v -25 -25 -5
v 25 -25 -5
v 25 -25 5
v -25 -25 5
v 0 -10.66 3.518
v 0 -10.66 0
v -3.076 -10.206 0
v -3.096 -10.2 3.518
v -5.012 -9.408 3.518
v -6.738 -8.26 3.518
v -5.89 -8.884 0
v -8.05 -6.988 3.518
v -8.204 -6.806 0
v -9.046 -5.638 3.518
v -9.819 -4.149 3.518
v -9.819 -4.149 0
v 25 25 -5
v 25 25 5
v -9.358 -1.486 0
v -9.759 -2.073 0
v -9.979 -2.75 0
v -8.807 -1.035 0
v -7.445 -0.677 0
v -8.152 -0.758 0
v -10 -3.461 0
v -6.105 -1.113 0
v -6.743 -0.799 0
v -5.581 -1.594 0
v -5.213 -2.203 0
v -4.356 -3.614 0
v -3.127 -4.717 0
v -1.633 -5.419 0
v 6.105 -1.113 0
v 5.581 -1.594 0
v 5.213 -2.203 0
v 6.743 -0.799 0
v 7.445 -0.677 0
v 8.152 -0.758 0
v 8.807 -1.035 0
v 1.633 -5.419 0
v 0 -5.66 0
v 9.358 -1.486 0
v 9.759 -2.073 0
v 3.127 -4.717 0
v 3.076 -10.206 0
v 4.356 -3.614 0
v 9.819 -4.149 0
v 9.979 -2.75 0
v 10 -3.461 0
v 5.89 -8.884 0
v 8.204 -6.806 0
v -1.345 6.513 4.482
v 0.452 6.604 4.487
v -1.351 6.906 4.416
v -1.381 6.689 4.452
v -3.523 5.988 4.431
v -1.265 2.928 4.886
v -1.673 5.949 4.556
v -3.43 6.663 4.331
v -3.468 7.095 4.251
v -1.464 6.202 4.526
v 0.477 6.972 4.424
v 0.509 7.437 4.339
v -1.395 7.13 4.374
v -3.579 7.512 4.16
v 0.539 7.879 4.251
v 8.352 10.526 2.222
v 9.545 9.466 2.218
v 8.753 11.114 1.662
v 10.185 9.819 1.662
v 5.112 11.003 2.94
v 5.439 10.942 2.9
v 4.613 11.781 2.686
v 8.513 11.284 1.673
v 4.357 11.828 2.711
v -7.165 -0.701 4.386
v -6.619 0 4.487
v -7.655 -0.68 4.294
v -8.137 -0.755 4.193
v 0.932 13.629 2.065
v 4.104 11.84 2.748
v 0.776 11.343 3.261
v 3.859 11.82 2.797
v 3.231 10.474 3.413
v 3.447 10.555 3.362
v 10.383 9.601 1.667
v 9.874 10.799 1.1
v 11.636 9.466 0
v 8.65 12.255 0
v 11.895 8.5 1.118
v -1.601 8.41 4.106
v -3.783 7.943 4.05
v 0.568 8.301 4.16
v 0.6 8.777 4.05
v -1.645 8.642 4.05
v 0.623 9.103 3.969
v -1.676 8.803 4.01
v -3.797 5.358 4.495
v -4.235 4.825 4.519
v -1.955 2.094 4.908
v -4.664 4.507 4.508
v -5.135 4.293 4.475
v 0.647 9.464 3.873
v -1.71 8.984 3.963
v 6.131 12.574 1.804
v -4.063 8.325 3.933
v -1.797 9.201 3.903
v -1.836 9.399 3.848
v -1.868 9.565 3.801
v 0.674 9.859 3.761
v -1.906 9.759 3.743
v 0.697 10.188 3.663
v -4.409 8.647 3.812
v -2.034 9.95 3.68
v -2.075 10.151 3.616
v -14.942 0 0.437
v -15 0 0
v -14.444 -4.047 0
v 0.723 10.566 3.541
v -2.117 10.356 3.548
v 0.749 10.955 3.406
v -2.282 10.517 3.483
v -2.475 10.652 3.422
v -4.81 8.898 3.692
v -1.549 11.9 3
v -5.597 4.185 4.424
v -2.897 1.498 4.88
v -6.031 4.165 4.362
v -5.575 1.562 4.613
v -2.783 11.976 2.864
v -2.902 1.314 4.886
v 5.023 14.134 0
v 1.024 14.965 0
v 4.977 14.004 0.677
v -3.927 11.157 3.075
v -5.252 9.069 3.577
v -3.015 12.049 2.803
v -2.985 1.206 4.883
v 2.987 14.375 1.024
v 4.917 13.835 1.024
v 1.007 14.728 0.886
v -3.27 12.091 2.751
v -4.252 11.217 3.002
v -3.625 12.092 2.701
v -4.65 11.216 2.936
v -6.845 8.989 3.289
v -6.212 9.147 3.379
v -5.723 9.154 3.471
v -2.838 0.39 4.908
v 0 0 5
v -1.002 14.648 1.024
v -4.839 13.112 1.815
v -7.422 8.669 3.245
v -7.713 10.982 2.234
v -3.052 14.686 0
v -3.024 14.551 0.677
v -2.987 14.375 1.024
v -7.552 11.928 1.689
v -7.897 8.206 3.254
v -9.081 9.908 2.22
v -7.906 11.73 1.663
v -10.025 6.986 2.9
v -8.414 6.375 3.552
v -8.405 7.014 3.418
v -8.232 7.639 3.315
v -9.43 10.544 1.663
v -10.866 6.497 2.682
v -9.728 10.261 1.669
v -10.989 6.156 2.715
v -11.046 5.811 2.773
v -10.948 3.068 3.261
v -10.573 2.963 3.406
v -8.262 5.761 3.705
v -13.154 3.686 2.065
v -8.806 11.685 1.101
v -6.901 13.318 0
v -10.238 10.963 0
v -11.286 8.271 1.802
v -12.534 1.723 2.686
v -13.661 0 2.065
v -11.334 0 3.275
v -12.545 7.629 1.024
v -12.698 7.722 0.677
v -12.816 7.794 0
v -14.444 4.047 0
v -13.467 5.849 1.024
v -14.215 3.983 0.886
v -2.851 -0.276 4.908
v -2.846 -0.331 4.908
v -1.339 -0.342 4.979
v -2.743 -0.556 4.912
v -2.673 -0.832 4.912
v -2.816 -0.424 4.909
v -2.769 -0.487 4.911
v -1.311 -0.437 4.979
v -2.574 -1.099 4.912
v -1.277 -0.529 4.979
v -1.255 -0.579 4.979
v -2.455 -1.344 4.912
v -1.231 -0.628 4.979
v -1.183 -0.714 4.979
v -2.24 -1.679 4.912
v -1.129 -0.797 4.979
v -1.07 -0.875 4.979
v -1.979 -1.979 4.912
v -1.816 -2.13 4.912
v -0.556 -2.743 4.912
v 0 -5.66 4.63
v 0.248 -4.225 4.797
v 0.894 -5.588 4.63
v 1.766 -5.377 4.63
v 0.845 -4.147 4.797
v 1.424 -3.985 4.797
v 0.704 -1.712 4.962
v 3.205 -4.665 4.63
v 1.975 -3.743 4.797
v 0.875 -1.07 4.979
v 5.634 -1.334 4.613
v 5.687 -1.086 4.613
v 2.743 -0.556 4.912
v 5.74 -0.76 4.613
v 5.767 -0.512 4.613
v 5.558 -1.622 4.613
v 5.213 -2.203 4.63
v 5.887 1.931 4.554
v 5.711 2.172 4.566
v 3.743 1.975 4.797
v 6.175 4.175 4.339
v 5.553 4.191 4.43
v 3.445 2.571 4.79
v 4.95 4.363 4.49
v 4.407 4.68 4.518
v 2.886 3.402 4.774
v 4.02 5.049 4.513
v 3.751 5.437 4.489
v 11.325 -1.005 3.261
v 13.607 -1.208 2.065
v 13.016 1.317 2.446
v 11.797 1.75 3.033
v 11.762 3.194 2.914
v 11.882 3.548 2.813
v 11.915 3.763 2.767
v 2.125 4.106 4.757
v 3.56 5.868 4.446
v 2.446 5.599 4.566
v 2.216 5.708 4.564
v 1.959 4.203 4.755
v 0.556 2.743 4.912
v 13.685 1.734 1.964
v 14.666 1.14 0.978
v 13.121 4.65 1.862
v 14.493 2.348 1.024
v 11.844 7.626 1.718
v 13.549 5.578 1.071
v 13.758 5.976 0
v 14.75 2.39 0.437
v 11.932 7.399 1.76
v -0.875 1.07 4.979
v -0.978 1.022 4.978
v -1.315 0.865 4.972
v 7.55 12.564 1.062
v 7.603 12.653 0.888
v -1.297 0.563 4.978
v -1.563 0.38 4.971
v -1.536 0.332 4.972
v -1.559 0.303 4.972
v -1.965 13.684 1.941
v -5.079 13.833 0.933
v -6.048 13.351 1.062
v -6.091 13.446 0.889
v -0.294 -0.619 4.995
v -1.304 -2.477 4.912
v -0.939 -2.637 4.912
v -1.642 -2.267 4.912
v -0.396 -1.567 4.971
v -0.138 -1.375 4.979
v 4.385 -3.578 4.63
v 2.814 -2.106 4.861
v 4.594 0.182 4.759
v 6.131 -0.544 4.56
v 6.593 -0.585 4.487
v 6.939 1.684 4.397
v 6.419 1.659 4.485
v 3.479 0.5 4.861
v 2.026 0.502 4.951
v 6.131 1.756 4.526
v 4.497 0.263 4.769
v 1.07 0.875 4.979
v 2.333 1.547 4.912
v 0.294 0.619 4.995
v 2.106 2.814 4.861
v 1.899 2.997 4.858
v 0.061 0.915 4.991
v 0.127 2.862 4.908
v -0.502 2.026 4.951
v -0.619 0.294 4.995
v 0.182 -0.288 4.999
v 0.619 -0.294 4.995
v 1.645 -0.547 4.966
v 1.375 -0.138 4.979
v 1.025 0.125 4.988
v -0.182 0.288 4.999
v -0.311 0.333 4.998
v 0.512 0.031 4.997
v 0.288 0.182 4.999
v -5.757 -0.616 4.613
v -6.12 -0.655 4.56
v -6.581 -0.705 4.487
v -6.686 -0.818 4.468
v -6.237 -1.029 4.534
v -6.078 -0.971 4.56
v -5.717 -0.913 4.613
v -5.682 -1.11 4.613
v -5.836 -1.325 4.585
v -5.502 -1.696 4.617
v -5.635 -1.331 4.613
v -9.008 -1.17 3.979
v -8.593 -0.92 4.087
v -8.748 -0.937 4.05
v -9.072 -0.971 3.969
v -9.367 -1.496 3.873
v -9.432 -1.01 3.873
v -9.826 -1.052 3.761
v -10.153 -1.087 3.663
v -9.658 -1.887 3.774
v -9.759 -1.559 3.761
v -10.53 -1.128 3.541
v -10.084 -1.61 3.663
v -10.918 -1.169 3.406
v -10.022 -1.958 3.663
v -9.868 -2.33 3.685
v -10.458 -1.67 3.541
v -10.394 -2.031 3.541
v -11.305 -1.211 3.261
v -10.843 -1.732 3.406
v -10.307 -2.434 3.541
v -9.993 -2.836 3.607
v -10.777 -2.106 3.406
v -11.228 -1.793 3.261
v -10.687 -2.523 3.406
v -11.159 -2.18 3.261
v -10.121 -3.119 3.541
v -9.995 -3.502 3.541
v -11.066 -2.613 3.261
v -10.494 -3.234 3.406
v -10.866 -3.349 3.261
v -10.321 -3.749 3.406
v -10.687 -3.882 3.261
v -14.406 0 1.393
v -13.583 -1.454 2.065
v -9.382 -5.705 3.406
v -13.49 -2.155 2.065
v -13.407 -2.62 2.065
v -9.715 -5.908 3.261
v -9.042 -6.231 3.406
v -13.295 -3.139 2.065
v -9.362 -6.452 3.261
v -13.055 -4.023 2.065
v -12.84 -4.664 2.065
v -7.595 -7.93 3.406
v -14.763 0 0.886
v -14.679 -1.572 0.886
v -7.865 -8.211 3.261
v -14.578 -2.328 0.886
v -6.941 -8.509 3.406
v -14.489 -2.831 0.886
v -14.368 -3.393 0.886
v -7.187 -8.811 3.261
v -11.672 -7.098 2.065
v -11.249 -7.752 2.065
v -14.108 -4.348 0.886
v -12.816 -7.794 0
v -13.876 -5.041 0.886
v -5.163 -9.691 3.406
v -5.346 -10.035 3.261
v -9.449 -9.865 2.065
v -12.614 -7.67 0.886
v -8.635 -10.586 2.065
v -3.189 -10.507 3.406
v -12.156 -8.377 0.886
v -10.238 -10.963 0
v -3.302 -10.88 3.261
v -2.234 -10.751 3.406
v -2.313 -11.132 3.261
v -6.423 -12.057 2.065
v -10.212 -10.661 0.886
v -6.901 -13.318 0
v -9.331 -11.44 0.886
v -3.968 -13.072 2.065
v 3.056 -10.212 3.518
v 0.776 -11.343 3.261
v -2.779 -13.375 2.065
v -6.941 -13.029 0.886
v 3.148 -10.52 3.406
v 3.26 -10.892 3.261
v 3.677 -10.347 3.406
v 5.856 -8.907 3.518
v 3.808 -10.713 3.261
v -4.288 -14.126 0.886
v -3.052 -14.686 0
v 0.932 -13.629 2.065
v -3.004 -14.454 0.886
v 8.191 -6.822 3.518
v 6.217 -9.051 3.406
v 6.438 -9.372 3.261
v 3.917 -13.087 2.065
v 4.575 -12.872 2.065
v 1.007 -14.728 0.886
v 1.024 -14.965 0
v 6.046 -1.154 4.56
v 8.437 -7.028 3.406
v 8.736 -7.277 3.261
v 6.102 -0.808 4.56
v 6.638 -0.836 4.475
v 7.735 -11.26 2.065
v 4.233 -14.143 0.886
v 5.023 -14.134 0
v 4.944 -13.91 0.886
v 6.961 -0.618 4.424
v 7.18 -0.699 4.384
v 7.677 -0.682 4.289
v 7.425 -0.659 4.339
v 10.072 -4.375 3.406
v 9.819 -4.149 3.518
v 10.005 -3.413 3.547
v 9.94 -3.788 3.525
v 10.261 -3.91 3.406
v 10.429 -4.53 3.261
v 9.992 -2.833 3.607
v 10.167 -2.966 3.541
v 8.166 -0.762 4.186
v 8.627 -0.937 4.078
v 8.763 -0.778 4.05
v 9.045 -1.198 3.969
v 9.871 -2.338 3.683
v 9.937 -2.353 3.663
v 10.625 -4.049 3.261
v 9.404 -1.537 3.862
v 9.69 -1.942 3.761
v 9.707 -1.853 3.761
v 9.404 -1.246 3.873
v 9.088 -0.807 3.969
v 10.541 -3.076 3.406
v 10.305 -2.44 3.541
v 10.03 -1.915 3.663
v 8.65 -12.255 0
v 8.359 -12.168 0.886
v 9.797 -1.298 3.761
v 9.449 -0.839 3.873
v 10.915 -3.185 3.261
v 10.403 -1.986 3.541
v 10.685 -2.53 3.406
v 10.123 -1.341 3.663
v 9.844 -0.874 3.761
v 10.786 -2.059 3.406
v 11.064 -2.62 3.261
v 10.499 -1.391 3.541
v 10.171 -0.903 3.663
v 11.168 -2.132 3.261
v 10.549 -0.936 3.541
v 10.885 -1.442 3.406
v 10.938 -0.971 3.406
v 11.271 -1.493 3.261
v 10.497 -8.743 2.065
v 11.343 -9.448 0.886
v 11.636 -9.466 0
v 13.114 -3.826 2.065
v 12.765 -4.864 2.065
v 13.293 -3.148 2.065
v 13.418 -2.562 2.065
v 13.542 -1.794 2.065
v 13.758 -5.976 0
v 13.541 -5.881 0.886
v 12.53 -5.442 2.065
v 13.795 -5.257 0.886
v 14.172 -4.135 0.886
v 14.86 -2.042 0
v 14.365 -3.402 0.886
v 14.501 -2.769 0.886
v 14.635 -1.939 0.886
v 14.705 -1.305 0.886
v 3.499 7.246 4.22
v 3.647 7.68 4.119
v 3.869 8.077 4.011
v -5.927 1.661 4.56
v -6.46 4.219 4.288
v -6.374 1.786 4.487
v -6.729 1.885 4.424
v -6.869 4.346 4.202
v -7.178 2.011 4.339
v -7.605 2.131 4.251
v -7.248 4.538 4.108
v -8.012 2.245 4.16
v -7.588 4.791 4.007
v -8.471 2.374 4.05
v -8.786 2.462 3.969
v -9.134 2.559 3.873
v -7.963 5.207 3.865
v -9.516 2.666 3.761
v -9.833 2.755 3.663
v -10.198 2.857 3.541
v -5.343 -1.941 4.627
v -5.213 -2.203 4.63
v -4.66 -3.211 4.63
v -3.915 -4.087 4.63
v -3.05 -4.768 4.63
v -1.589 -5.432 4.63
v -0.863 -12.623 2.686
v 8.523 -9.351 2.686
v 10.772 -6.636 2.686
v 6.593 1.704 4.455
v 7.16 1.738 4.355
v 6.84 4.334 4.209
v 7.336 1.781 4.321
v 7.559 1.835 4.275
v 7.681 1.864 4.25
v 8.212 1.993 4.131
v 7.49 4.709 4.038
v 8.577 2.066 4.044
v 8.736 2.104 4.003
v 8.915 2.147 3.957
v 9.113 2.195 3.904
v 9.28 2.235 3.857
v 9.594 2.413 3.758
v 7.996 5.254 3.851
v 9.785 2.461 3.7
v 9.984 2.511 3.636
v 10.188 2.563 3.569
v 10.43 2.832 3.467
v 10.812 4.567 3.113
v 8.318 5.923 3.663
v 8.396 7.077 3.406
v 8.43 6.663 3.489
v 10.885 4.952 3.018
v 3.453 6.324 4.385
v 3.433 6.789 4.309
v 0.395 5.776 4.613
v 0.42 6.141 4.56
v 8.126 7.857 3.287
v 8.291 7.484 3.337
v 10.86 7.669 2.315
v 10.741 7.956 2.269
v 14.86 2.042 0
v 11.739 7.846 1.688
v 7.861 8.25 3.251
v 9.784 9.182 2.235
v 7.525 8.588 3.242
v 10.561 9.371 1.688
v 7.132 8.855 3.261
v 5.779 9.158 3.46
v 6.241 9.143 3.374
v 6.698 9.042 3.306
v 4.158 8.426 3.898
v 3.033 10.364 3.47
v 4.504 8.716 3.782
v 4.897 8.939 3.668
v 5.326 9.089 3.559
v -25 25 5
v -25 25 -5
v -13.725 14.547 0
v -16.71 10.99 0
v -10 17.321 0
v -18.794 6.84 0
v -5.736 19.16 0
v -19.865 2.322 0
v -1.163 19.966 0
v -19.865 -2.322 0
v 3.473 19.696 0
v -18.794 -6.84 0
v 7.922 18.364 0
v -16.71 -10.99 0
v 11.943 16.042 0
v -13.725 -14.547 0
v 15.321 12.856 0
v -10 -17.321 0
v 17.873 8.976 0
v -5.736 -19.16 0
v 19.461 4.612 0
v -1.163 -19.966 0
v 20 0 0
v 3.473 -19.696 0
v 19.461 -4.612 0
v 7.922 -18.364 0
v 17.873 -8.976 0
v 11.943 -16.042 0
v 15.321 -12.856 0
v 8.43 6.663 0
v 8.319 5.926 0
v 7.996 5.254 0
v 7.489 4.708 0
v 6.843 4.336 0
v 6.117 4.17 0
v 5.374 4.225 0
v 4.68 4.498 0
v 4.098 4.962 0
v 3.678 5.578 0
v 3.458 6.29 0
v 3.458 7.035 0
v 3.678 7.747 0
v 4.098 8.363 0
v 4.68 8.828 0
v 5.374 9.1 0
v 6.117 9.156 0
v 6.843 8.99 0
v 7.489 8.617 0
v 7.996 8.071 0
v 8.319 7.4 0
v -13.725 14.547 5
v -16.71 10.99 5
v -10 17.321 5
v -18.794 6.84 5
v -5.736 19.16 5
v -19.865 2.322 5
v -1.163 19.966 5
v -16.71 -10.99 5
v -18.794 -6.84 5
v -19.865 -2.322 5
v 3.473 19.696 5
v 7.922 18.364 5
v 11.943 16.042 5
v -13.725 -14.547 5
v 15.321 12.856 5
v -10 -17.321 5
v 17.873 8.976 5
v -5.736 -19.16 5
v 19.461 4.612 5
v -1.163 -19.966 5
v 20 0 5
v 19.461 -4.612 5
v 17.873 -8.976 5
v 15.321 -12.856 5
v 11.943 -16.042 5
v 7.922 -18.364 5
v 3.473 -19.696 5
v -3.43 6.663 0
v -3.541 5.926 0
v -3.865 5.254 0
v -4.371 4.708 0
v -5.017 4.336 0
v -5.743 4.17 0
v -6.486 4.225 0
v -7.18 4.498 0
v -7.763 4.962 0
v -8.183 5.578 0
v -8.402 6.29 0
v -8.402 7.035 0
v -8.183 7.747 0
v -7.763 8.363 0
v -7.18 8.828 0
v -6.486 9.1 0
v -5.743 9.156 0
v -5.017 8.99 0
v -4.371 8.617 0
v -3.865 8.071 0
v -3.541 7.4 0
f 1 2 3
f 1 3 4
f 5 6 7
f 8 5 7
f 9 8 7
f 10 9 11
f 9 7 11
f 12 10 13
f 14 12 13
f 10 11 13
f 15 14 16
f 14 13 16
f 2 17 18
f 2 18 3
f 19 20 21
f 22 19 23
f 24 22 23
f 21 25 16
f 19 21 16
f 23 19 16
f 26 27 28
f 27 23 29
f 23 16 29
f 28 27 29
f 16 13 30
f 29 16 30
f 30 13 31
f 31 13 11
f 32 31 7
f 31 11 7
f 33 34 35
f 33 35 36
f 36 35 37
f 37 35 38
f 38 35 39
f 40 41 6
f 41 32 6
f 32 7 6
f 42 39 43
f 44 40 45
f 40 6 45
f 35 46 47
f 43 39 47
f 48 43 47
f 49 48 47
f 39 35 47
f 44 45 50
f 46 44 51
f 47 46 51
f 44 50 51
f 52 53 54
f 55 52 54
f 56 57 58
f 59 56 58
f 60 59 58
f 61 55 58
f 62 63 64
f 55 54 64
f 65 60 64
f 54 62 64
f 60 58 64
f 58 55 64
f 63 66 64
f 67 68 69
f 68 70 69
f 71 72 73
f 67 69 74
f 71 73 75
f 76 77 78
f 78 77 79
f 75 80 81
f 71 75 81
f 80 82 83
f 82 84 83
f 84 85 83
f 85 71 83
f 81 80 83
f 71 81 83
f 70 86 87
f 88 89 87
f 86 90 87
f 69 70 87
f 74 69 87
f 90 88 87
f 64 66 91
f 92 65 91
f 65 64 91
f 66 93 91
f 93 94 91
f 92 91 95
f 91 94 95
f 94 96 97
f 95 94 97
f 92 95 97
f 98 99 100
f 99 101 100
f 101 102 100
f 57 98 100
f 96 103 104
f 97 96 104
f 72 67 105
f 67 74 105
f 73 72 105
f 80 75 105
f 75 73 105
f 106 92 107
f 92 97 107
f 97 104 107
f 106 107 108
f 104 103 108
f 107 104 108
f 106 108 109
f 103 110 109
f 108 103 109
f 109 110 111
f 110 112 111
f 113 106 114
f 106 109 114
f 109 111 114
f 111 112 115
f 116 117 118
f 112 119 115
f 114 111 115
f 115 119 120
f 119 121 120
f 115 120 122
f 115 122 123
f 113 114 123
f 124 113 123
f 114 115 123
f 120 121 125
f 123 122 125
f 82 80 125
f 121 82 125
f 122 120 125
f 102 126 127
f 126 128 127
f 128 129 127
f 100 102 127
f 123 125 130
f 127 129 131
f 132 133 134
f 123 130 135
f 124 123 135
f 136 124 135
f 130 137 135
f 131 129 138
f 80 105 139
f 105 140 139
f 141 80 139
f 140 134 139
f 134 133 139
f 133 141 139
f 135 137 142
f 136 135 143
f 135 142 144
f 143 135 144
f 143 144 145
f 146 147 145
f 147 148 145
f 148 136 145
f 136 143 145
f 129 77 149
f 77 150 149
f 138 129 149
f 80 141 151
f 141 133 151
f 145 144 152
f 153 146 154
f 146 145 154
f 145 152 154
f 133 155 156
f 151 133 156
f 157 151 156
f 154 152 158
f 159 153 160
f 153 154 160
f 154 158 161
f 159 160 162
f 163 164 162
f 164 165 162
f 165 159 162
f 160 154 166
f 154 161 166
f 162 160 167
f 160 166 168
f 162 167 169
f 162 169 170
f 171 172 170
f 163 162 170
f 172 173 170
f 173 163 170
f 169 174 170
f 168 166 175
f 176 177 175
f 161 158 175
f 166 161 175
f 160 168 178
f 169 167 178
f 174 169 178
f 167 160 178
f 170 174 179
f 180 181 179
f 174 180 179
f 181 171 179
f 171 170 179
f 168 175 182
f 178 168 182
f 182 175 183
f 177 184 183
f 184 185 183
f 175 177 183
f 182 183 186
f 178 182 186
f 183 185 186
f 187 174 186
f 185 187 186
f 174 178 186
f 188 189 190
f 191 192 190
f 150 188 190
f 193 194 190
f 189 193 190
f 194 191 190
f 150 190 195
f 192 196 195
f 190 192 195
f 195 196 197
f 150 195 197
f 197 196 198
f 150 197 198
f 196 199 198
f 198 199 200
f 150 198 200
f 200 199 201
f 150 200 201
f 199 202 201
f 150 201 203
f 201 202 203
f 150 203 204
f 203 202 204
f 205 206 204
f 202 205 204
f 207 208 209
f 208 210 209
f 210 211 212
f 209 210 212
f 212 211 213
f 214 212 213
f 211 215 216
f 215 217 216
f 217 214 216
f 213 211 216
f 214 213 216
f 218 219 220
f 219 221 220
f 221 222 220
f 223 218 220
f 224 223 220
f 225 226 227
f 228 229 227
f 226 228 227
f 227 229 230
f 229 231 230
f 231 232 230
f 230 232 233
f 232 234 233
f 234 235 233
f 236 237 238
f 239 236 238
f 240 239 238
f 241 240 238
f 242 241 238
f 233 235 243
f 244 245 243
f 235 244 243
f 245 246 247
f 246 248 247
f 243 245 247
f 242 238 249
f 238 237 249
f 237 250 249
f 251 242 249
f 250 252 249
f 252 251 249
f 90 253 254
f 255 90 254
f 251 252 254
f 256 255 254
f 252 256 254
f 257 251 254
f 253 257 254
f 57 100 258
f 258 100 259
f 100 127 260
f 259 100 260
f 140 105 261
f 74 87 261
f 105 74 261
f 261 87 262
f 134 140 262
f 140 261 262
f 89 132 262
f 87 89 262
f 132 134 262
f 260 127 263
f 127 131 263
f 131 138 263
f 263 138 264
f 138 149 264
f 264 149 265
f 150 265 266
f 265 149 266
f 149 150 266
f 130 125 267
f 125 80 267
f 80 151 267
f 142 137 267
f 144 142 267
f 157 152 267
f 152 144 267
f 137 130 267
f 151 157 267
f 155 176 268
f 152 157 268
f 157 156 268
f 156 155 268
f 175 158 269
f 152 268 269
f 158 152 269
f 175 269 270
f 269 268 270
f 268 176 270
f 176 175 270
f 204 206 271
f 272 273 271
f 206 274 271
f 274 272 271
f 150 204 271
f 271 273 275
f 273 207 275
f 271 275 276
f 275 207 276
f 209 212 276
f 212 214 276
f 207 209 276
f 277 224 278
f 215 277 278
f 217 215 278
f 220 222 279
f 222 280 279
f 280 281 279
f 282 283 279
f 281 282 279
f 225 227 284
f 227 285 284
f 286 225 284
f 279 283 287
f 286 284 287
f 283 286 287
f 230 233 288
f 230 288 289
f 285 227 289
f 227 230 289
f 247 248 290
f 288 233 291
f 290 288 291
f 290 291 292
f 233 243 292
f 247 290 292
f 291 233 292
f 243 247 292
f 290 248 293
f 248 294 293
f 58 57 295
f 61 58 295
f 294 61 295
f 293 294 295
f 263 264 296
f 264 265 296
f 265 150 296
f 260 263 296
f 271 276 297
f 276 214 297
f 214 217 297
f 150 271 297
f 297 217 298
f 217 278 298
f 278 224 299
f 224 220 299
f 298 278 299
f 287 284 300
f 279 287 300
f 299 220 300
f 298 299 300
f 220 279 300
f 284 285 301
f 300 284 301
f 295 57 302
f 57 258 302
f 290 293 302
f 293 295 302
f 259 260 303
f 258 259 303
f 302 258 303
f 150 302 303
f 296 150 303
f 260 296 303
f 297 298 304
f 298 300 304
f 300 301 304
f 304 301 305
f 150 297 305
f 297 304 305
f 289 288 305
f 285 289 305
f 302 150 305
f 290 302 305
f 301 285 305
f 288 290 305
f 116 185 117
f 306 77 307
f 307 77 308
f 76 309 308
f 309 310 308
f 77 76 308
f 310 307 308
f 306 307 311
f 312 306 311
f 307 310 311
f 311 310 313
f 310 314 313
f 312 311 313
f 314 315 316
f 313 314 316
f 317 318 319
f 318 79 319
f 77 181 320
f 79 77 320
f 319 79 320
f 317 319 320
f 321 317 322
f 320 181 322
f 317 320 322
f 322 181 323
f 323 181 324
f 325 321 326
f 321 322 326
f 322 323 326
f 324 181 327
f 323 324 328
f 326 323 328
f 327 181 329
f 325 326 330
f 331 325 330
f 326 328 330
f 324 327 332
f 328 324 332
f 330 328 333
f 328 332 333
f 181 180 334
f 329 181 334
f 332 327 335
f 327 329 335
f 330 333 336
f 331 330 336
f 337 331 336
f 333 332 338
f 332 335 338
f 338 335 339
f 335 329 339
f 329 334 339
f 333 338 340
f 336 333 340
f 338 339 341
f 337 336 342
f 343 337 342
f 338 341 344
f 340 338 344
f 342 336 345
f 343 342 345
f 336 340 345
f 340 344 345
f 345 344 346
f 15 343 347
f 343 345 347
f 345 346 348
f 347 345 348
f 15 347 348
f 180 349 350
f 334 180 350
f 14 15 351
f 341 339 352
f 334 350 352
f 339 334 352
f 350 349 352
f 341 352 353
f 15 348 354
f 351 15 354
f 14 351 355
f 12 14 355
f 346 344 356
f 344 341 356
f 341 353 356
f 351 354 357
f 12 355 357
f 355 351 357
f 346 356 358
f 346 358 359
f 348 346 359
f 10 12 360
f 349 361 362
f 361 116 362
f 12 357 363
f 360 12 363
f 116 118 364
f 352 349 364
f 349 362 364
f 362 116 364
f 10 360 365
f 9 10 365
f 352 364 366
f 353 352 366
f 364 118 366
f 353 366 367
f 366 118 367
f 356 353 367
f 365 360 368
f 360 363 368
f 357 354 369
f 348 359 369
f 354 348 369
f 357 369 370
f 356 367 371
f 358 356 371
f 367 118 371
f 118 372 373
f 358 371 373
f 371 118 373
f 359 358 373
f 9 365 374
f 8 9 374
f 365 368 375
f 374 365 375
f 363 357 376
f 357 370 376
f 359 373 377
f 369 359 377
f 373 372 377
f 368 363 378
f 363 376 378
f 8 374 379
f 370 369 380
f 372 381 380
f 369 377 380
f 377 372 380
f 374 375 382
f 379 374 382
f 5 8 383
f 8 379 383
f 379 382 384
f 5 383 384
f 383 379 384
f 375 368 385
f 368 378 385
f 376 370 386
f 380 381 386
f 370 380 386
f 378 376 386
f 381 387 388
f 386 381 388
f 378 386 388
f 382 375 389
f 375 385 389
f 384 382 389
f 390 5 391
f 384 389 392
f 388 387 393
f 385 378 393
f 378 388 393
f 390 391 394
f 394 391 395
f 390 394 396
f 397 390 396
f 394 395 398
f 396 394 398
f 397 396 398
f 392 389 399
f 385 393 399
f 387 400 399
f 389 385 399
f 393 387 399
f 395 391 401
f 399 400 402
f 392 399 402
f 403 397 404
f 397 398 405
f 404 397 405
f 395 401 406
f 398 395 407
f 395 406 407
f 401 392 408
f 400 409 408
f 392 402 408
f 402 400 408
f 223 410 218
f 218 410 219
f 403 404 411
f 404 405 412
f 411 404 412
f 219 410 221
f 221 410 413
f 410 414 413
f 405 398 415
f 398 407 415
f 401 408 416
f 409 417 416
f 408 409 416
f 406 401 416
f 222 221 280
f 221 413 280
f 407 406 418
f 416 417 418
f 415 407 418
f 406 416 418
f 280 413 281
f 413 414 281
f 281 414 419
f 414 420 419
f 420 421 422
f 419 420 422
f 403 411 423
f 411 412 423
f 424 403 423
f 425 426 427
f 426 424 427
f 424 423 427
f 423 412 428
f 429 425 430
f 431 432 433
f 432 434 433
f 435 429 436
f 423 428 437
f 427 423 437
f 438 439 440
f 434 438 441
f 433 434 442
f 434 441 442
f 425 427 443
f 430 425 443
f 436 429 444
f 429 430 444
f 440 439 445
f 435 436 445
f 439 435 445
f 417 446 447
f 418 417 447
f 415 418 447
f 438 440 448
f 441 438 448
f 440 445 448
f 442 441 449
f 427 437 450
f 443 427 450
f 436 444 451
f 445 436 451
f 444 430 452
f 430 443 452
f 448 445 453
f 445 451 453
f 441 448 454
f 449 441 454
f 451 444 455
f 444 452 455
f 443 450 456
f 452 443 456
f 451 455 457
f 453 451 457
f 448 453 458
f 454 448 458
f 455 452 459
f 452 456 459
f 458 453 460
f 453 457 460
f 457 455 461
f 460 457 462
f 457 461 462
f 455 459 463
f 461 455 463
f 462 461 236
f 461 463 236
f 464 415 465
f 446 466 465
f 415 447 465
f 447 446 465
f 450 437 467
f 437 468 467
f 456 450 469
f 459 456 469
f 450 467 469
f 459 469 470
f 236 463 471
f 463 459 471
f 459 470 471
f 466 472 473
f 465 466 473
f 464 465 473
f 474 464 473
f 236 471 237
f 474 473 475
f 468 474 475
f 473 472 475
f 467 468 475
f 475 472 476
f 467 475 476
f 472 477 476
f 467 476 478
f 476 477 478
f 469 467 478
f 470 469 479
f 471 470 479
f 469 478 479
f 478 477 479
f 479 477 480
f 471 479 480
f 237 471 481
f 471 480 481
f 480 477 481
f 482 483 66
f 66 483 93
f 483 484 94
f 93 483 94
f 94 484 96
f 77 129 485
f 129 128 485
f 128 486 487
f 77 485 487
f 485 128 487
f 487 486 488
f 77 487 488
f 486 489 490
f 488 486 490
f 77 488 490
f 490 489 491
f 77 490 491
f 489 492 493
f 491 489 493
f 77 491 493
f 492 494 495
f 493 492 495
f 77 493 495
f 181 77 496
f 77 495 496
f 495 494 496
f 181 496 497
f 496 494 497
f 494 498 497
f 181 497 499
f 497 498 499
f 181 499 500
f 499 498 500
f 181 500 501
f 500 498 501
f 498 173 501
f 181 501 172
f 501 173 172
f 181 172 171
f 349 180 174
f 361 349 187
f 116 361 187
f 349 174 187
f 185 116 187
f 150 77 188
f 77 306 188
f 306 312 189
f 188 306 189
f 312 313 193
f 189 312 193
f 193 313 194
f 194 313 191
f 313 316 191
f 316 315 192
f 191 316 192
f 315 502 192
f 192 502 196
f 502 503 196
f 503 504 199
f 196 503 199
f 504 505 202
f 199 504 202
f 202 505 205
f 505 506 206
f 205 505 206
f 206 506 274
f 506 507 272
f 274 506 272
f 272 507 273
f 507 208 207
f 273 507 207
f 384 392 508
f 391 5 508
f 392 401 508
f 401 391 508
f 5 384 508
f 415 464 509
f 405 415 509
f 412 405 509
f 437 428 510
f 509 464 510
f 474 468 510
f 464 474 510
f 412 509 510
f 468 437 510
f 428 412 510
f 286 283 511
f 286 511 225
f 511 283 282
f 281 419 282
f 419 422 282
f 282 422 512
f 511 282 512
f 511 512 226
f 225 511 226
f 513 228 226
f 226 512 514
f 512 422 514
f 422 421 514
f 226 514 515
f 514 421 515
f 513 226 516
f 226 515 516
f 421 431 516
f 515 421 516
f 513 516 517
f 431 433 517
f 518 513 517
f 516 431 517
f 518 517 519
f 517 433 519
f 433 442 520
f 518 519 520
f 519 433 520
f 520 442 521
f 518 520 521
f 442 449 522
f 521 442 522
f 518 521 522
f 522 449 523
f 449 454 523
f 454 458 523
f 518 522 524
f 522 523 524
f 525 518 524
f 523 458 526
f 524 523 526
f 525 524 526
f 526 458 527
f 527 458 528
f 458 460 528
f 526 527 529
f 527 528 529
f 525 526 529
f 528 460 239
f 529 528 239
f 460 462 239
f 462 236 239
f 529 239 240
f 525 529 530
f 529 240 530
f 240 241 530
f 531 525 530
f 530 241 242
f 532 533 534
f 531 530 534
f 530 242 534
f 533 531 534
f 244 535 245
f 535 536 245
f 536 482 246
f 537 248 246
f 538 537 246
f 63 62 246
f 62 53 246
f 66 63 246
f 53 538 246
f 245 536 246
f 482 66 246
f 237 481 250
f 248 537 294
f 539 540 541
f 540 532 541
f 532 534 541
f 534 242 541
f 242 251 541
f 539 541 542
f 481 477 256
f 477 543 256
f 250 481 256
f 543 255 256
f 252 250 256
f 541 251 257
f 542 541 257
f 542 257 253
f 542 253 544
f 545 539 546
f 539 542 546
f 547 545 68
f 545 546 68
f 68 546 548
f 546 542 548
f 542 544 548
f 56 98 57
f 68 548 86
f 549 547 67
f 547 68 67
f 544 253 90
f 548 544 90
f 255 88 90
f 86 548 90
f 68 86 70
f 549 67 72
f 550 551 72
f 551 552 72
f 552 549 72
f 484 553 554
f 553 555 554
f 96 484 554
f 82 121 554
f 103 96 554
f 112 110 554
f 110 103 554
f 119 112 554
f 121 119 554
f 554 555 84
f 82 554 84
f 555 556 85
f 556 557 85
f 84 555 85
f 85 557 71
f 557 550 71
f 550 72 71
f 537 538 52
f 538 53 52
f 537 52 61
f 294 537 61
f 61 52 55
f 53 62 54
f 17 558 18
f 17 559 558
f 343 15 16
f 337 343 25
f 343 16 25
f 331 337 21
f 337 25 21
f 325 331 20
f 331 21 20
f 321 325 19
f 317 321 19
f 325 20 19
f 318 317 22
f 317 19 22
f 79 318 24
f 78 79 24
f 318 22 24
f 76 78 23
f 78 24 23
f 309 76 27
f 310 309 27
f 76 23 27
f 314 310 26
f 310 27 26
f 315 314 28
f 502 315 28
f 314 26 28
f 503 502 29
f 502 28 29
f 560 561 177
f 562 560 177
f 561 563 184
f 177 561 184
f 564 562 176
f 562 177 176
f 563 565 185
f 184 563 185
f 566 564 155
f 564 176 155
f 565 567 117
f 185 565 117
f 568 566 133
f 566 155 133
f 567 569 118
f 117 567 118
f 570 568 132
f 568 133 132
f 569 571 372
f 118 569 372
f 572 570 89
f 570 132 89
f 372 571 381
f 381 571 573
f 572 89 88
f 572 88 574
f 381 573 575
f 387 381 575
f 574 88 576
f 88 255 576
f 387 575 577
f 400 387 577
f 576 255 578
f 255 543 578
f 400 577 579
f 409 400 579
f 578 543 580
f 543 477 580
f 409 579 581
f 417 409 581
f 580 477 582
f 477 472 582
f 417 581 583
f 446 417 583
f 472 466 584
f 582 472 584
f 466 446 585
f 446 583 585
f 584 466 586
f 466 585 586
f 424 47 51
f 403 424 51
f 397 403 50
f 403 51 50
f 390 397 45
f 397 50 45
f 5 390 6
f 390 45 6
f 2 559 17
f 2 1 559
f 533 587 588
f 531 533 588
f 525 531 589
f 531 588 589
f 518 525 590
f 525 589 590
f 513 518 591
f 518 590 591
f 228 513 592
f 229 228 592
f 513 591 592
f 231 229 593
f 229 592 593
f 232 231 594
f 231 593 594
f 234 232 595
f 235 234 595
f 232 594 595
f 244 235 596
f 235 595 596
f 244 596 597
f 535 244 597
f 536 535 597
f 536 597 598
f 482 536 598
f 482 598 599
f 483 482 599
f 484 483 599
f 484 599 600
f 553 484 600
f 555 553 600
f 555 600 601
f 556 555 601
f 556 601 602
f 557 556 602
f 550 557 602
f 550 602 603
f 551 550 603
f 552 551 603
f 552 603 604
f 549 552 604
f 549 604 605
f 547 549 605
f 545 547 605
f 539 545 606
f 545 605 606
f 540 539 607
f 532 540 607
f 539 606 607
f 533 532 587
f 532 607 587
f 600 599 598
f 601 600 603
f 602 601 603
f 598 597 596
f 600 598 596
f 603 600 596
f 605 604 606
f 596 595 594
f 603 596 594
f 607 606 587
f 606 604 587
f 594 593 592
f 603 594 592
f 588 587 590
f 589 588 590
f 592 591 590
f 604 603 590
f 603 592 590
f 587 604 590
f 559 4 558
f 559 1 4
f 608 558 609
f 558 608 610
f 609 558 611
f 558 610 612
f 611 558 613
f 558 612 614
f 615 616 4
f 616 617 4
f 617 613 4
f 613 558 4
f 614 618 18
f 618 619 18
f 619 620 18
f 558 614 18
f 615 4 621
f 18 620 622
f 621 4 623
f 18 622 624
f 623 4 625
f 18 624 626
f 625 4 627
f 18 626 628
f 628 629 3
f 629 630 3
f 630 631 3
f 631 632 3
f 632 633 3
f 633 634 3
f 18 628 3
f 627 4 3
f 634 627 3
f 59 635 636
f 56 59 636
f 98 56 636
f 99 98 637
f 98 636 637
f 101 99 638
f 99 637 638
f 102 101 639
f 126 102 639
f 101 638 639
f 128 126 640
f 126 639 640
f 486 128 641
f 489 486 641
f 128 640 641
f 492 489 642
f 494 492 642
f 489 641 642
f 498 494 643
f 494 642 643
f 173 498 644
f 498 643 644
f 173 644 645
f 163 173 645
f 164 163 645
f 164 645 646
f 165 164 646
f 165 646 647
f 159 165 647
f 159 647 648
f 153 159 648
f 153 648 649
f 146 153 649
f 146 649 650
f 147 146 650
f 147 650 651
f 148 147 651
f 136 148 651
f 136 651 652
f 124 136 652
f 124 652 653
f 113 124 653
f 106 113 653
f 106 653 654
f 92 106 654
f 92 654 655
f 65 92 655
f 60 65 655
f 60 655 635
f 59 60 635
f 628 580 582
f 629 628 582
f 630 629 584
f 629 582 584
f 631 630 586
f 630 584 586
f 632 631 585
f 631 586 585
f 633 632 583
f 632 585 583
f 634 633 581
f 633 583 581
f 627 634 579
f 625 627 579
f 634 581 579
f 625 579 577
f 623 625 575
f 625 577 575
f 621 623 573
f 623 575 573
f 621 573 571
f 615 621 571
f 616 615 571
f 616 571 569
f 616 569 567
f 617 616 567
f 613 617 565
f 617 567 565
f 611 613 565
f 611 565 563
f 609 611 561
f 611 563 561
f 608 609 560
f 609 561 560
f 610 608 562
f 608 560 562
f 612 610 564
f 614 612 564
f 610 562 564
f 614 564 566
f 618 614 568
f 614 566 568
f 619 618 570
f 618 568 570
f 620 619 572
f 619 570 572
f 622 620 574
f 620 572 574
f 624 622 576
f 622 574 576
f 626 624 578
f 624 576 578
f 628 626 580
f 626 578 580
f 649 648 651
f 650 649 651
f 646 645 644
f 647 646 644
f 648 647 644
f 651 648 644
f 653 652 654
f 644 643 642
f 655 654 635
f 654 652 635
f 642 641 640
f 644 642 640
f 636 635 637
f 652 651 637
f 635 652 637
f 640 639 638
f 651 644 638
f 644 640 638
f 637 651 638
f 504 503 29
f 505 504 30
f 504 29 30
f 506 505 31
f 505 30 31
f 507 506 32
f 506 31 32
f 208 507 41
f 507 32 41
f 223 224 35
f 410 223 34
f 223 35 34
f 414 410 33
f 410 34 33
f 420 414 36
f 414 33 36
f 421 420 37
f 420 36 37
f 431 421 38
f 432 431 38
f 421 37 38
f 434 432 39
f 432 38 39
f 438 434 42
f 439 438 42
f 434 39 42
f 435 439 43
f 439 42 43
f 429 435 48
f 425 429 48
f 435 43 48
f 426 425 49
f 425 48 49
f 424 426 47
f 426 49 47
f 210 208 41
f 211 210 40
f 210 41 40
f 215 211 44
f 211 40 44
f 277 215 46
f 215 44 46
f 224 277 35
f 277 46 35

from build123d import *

# Parameters (mm, degrees)
F2_R     = 2.5
F3_DEPTH = 25
F4_R     = 20
F4_R_2   = 15
F4_R_3   = 2.5
F5_DEPTH = 5
F6_DEPTH = 5


with BuildPart() as f1:
    # F0 (on Front) → F1 (revolve)
    with BuildSketch(Plane.XZ):
        with BuildLine():
            Line((0, 0), (0, 5))
            add(Edge.make_bspline(
                [(0, 5), (-15, 5), (-15, 0)],
                knots=[4.7123889804, 4.7123889804, 4.7123889804, 6.2831853072, 6.2831853072, 6.2831853072], degree=2, weights=[1, 0.7071067812, 1]))
            Line((-15, 0), (0, 0))
        make_face()
    revolve(axis=Axis((0, 0, 2.5), (0, 0, 1)))

    # F2 (on face) → F3 (cut)
    with BuildSketch(Plane(origin=(0, 0, 0), x_dir=(1, 0, 0), z_dir=(0, 0, -1))):
        with Locations((5.9301354922, -6.6626928747)):
            Circle(F2_R)
        with BuildLine():
            ThreePointArc((-5.2131647244, 2.2031189874), (-3.1274667568, 4.7169663346), (0, 5.6595776977))
            ThreePointArc((0, 5.6595776977), (3.1274667568, 4.7169663346), (5.2131647244, 2.2031189874))
            ThreePointArc((5.2131647244, 2.2031189874), (8.4891528404, 0.8734942796), (9.8187775482, 4.1494823956))
            ThreePointArc((9.8187775482, 4.1494823956), (5.8904527284, 8.8842086506), (0, 10.6595776977))
            ThreePointArc((0, 10.6595776977), (-5.8904527284, 8.8842086506), (-9.8187775482, 4.1494823956))
            ThreePointArc((-9.8187775482, 4.1494823956), (-8.4891528404, 0.8734942796), (-5.2131647244, 2.2031189874))
        make_face()
        with Locations((-5.9301354922, -6.6626928747)):
            Circle(F2_R)
    extrude(amount=-F3_DEPTH, mode=Mode.SUBTRACT)

    # F4 (on face) → F5 (join)
    with BuildSketch(Plane(origin=(0, 0, 0), x_dir=(1, 0, 0), z_dir=(0, 0, -1))):
        Polygon((-25, -25), (0, -25), (25, -25), (25, 0), (25, 25), (0, 25), (-25, 25), (-25, 0), align=None)
        Circle(F4_R, mode=Mode.SUBTRACT)
        Circle(F4_R)
        Circle(F4_R_2, mode=Mode.SUBTRACT)
        Circle(F4_R_2)
        with Locations((-5.9301354922, -6.6626928747)):
            Circle(F4_R_3, mode=Mode.SUBTRACT)
        with Locations((5.9301354922, -6.6626928747)):
            Circle(F4_R_3, mode=Mode.SUBTRACT)
        with BuildLine():
            ThreePointArc((-5.2131647244, 2.2031189874), (-8.4891528404, 0.8734942796), (-9.8187775482, 4.1494823956))
            ThreePointArc((-9.8187775482, 4.1494823956), (0, 10.6595776977), (9.8187775482, 4.1494823956))
            ThreePointArc((9.8187775482, 4.1494823956), (8.4891528404, 0.8734942796), (5.2131647244, 2.2031189874))
            ThreePointArc((5.2131647244, 2.2031189874), (0, 5.6595776977), (-5.2131647244, 2.2031189874))
        make_face(mode=Mode.SUBTRACT)
        with BuildLine():
            ThreePointArc((9.8187775482, 4.1494823956), (0, 10.6595776977), (-9.8187775482, 4.1494823956))
            ThreePointArc((-9.8187775482, 4.1494823956), (-8.4891528404, 0.8734942796), (-5.2131647244, 2.2031189874))
            ThreePointArc((-5.2131647244, 2.2031189874), (0, 5.6595776977), (5.2131647244, 2.2031189874))
            ThreePointArc((5.2131647244, 2.2031189874), (8.4891528404, 0.8734942796), (9.8187775482, 4.1494823956))
        make_face()
        with Locations((5.9301354922, -6.6626928747)):
            Circle(F4_R_3)
        with Locations((-5.9301354922, -6.6626928747)):
            Circle(F4_R_3)
    extrude(amount=F5_DEPTH)

    # F4 (on face) → F6 (join)
    with BuildSketch(Plane(origin=(0, 0, 0), x_dir=(1, 0, 0), z_dir=(0, 0, -1))):
        Polygon((-25, -25), (0, -25), (25, -25), (25, 0), (25, 25), (0, 25), (-25, 25), (-25, 0), align=None)
        Circle(F4_R, mode=Mode.SUBTRACT)
    extrude(amount=-F6_DEPTH)


solid = f1.part
